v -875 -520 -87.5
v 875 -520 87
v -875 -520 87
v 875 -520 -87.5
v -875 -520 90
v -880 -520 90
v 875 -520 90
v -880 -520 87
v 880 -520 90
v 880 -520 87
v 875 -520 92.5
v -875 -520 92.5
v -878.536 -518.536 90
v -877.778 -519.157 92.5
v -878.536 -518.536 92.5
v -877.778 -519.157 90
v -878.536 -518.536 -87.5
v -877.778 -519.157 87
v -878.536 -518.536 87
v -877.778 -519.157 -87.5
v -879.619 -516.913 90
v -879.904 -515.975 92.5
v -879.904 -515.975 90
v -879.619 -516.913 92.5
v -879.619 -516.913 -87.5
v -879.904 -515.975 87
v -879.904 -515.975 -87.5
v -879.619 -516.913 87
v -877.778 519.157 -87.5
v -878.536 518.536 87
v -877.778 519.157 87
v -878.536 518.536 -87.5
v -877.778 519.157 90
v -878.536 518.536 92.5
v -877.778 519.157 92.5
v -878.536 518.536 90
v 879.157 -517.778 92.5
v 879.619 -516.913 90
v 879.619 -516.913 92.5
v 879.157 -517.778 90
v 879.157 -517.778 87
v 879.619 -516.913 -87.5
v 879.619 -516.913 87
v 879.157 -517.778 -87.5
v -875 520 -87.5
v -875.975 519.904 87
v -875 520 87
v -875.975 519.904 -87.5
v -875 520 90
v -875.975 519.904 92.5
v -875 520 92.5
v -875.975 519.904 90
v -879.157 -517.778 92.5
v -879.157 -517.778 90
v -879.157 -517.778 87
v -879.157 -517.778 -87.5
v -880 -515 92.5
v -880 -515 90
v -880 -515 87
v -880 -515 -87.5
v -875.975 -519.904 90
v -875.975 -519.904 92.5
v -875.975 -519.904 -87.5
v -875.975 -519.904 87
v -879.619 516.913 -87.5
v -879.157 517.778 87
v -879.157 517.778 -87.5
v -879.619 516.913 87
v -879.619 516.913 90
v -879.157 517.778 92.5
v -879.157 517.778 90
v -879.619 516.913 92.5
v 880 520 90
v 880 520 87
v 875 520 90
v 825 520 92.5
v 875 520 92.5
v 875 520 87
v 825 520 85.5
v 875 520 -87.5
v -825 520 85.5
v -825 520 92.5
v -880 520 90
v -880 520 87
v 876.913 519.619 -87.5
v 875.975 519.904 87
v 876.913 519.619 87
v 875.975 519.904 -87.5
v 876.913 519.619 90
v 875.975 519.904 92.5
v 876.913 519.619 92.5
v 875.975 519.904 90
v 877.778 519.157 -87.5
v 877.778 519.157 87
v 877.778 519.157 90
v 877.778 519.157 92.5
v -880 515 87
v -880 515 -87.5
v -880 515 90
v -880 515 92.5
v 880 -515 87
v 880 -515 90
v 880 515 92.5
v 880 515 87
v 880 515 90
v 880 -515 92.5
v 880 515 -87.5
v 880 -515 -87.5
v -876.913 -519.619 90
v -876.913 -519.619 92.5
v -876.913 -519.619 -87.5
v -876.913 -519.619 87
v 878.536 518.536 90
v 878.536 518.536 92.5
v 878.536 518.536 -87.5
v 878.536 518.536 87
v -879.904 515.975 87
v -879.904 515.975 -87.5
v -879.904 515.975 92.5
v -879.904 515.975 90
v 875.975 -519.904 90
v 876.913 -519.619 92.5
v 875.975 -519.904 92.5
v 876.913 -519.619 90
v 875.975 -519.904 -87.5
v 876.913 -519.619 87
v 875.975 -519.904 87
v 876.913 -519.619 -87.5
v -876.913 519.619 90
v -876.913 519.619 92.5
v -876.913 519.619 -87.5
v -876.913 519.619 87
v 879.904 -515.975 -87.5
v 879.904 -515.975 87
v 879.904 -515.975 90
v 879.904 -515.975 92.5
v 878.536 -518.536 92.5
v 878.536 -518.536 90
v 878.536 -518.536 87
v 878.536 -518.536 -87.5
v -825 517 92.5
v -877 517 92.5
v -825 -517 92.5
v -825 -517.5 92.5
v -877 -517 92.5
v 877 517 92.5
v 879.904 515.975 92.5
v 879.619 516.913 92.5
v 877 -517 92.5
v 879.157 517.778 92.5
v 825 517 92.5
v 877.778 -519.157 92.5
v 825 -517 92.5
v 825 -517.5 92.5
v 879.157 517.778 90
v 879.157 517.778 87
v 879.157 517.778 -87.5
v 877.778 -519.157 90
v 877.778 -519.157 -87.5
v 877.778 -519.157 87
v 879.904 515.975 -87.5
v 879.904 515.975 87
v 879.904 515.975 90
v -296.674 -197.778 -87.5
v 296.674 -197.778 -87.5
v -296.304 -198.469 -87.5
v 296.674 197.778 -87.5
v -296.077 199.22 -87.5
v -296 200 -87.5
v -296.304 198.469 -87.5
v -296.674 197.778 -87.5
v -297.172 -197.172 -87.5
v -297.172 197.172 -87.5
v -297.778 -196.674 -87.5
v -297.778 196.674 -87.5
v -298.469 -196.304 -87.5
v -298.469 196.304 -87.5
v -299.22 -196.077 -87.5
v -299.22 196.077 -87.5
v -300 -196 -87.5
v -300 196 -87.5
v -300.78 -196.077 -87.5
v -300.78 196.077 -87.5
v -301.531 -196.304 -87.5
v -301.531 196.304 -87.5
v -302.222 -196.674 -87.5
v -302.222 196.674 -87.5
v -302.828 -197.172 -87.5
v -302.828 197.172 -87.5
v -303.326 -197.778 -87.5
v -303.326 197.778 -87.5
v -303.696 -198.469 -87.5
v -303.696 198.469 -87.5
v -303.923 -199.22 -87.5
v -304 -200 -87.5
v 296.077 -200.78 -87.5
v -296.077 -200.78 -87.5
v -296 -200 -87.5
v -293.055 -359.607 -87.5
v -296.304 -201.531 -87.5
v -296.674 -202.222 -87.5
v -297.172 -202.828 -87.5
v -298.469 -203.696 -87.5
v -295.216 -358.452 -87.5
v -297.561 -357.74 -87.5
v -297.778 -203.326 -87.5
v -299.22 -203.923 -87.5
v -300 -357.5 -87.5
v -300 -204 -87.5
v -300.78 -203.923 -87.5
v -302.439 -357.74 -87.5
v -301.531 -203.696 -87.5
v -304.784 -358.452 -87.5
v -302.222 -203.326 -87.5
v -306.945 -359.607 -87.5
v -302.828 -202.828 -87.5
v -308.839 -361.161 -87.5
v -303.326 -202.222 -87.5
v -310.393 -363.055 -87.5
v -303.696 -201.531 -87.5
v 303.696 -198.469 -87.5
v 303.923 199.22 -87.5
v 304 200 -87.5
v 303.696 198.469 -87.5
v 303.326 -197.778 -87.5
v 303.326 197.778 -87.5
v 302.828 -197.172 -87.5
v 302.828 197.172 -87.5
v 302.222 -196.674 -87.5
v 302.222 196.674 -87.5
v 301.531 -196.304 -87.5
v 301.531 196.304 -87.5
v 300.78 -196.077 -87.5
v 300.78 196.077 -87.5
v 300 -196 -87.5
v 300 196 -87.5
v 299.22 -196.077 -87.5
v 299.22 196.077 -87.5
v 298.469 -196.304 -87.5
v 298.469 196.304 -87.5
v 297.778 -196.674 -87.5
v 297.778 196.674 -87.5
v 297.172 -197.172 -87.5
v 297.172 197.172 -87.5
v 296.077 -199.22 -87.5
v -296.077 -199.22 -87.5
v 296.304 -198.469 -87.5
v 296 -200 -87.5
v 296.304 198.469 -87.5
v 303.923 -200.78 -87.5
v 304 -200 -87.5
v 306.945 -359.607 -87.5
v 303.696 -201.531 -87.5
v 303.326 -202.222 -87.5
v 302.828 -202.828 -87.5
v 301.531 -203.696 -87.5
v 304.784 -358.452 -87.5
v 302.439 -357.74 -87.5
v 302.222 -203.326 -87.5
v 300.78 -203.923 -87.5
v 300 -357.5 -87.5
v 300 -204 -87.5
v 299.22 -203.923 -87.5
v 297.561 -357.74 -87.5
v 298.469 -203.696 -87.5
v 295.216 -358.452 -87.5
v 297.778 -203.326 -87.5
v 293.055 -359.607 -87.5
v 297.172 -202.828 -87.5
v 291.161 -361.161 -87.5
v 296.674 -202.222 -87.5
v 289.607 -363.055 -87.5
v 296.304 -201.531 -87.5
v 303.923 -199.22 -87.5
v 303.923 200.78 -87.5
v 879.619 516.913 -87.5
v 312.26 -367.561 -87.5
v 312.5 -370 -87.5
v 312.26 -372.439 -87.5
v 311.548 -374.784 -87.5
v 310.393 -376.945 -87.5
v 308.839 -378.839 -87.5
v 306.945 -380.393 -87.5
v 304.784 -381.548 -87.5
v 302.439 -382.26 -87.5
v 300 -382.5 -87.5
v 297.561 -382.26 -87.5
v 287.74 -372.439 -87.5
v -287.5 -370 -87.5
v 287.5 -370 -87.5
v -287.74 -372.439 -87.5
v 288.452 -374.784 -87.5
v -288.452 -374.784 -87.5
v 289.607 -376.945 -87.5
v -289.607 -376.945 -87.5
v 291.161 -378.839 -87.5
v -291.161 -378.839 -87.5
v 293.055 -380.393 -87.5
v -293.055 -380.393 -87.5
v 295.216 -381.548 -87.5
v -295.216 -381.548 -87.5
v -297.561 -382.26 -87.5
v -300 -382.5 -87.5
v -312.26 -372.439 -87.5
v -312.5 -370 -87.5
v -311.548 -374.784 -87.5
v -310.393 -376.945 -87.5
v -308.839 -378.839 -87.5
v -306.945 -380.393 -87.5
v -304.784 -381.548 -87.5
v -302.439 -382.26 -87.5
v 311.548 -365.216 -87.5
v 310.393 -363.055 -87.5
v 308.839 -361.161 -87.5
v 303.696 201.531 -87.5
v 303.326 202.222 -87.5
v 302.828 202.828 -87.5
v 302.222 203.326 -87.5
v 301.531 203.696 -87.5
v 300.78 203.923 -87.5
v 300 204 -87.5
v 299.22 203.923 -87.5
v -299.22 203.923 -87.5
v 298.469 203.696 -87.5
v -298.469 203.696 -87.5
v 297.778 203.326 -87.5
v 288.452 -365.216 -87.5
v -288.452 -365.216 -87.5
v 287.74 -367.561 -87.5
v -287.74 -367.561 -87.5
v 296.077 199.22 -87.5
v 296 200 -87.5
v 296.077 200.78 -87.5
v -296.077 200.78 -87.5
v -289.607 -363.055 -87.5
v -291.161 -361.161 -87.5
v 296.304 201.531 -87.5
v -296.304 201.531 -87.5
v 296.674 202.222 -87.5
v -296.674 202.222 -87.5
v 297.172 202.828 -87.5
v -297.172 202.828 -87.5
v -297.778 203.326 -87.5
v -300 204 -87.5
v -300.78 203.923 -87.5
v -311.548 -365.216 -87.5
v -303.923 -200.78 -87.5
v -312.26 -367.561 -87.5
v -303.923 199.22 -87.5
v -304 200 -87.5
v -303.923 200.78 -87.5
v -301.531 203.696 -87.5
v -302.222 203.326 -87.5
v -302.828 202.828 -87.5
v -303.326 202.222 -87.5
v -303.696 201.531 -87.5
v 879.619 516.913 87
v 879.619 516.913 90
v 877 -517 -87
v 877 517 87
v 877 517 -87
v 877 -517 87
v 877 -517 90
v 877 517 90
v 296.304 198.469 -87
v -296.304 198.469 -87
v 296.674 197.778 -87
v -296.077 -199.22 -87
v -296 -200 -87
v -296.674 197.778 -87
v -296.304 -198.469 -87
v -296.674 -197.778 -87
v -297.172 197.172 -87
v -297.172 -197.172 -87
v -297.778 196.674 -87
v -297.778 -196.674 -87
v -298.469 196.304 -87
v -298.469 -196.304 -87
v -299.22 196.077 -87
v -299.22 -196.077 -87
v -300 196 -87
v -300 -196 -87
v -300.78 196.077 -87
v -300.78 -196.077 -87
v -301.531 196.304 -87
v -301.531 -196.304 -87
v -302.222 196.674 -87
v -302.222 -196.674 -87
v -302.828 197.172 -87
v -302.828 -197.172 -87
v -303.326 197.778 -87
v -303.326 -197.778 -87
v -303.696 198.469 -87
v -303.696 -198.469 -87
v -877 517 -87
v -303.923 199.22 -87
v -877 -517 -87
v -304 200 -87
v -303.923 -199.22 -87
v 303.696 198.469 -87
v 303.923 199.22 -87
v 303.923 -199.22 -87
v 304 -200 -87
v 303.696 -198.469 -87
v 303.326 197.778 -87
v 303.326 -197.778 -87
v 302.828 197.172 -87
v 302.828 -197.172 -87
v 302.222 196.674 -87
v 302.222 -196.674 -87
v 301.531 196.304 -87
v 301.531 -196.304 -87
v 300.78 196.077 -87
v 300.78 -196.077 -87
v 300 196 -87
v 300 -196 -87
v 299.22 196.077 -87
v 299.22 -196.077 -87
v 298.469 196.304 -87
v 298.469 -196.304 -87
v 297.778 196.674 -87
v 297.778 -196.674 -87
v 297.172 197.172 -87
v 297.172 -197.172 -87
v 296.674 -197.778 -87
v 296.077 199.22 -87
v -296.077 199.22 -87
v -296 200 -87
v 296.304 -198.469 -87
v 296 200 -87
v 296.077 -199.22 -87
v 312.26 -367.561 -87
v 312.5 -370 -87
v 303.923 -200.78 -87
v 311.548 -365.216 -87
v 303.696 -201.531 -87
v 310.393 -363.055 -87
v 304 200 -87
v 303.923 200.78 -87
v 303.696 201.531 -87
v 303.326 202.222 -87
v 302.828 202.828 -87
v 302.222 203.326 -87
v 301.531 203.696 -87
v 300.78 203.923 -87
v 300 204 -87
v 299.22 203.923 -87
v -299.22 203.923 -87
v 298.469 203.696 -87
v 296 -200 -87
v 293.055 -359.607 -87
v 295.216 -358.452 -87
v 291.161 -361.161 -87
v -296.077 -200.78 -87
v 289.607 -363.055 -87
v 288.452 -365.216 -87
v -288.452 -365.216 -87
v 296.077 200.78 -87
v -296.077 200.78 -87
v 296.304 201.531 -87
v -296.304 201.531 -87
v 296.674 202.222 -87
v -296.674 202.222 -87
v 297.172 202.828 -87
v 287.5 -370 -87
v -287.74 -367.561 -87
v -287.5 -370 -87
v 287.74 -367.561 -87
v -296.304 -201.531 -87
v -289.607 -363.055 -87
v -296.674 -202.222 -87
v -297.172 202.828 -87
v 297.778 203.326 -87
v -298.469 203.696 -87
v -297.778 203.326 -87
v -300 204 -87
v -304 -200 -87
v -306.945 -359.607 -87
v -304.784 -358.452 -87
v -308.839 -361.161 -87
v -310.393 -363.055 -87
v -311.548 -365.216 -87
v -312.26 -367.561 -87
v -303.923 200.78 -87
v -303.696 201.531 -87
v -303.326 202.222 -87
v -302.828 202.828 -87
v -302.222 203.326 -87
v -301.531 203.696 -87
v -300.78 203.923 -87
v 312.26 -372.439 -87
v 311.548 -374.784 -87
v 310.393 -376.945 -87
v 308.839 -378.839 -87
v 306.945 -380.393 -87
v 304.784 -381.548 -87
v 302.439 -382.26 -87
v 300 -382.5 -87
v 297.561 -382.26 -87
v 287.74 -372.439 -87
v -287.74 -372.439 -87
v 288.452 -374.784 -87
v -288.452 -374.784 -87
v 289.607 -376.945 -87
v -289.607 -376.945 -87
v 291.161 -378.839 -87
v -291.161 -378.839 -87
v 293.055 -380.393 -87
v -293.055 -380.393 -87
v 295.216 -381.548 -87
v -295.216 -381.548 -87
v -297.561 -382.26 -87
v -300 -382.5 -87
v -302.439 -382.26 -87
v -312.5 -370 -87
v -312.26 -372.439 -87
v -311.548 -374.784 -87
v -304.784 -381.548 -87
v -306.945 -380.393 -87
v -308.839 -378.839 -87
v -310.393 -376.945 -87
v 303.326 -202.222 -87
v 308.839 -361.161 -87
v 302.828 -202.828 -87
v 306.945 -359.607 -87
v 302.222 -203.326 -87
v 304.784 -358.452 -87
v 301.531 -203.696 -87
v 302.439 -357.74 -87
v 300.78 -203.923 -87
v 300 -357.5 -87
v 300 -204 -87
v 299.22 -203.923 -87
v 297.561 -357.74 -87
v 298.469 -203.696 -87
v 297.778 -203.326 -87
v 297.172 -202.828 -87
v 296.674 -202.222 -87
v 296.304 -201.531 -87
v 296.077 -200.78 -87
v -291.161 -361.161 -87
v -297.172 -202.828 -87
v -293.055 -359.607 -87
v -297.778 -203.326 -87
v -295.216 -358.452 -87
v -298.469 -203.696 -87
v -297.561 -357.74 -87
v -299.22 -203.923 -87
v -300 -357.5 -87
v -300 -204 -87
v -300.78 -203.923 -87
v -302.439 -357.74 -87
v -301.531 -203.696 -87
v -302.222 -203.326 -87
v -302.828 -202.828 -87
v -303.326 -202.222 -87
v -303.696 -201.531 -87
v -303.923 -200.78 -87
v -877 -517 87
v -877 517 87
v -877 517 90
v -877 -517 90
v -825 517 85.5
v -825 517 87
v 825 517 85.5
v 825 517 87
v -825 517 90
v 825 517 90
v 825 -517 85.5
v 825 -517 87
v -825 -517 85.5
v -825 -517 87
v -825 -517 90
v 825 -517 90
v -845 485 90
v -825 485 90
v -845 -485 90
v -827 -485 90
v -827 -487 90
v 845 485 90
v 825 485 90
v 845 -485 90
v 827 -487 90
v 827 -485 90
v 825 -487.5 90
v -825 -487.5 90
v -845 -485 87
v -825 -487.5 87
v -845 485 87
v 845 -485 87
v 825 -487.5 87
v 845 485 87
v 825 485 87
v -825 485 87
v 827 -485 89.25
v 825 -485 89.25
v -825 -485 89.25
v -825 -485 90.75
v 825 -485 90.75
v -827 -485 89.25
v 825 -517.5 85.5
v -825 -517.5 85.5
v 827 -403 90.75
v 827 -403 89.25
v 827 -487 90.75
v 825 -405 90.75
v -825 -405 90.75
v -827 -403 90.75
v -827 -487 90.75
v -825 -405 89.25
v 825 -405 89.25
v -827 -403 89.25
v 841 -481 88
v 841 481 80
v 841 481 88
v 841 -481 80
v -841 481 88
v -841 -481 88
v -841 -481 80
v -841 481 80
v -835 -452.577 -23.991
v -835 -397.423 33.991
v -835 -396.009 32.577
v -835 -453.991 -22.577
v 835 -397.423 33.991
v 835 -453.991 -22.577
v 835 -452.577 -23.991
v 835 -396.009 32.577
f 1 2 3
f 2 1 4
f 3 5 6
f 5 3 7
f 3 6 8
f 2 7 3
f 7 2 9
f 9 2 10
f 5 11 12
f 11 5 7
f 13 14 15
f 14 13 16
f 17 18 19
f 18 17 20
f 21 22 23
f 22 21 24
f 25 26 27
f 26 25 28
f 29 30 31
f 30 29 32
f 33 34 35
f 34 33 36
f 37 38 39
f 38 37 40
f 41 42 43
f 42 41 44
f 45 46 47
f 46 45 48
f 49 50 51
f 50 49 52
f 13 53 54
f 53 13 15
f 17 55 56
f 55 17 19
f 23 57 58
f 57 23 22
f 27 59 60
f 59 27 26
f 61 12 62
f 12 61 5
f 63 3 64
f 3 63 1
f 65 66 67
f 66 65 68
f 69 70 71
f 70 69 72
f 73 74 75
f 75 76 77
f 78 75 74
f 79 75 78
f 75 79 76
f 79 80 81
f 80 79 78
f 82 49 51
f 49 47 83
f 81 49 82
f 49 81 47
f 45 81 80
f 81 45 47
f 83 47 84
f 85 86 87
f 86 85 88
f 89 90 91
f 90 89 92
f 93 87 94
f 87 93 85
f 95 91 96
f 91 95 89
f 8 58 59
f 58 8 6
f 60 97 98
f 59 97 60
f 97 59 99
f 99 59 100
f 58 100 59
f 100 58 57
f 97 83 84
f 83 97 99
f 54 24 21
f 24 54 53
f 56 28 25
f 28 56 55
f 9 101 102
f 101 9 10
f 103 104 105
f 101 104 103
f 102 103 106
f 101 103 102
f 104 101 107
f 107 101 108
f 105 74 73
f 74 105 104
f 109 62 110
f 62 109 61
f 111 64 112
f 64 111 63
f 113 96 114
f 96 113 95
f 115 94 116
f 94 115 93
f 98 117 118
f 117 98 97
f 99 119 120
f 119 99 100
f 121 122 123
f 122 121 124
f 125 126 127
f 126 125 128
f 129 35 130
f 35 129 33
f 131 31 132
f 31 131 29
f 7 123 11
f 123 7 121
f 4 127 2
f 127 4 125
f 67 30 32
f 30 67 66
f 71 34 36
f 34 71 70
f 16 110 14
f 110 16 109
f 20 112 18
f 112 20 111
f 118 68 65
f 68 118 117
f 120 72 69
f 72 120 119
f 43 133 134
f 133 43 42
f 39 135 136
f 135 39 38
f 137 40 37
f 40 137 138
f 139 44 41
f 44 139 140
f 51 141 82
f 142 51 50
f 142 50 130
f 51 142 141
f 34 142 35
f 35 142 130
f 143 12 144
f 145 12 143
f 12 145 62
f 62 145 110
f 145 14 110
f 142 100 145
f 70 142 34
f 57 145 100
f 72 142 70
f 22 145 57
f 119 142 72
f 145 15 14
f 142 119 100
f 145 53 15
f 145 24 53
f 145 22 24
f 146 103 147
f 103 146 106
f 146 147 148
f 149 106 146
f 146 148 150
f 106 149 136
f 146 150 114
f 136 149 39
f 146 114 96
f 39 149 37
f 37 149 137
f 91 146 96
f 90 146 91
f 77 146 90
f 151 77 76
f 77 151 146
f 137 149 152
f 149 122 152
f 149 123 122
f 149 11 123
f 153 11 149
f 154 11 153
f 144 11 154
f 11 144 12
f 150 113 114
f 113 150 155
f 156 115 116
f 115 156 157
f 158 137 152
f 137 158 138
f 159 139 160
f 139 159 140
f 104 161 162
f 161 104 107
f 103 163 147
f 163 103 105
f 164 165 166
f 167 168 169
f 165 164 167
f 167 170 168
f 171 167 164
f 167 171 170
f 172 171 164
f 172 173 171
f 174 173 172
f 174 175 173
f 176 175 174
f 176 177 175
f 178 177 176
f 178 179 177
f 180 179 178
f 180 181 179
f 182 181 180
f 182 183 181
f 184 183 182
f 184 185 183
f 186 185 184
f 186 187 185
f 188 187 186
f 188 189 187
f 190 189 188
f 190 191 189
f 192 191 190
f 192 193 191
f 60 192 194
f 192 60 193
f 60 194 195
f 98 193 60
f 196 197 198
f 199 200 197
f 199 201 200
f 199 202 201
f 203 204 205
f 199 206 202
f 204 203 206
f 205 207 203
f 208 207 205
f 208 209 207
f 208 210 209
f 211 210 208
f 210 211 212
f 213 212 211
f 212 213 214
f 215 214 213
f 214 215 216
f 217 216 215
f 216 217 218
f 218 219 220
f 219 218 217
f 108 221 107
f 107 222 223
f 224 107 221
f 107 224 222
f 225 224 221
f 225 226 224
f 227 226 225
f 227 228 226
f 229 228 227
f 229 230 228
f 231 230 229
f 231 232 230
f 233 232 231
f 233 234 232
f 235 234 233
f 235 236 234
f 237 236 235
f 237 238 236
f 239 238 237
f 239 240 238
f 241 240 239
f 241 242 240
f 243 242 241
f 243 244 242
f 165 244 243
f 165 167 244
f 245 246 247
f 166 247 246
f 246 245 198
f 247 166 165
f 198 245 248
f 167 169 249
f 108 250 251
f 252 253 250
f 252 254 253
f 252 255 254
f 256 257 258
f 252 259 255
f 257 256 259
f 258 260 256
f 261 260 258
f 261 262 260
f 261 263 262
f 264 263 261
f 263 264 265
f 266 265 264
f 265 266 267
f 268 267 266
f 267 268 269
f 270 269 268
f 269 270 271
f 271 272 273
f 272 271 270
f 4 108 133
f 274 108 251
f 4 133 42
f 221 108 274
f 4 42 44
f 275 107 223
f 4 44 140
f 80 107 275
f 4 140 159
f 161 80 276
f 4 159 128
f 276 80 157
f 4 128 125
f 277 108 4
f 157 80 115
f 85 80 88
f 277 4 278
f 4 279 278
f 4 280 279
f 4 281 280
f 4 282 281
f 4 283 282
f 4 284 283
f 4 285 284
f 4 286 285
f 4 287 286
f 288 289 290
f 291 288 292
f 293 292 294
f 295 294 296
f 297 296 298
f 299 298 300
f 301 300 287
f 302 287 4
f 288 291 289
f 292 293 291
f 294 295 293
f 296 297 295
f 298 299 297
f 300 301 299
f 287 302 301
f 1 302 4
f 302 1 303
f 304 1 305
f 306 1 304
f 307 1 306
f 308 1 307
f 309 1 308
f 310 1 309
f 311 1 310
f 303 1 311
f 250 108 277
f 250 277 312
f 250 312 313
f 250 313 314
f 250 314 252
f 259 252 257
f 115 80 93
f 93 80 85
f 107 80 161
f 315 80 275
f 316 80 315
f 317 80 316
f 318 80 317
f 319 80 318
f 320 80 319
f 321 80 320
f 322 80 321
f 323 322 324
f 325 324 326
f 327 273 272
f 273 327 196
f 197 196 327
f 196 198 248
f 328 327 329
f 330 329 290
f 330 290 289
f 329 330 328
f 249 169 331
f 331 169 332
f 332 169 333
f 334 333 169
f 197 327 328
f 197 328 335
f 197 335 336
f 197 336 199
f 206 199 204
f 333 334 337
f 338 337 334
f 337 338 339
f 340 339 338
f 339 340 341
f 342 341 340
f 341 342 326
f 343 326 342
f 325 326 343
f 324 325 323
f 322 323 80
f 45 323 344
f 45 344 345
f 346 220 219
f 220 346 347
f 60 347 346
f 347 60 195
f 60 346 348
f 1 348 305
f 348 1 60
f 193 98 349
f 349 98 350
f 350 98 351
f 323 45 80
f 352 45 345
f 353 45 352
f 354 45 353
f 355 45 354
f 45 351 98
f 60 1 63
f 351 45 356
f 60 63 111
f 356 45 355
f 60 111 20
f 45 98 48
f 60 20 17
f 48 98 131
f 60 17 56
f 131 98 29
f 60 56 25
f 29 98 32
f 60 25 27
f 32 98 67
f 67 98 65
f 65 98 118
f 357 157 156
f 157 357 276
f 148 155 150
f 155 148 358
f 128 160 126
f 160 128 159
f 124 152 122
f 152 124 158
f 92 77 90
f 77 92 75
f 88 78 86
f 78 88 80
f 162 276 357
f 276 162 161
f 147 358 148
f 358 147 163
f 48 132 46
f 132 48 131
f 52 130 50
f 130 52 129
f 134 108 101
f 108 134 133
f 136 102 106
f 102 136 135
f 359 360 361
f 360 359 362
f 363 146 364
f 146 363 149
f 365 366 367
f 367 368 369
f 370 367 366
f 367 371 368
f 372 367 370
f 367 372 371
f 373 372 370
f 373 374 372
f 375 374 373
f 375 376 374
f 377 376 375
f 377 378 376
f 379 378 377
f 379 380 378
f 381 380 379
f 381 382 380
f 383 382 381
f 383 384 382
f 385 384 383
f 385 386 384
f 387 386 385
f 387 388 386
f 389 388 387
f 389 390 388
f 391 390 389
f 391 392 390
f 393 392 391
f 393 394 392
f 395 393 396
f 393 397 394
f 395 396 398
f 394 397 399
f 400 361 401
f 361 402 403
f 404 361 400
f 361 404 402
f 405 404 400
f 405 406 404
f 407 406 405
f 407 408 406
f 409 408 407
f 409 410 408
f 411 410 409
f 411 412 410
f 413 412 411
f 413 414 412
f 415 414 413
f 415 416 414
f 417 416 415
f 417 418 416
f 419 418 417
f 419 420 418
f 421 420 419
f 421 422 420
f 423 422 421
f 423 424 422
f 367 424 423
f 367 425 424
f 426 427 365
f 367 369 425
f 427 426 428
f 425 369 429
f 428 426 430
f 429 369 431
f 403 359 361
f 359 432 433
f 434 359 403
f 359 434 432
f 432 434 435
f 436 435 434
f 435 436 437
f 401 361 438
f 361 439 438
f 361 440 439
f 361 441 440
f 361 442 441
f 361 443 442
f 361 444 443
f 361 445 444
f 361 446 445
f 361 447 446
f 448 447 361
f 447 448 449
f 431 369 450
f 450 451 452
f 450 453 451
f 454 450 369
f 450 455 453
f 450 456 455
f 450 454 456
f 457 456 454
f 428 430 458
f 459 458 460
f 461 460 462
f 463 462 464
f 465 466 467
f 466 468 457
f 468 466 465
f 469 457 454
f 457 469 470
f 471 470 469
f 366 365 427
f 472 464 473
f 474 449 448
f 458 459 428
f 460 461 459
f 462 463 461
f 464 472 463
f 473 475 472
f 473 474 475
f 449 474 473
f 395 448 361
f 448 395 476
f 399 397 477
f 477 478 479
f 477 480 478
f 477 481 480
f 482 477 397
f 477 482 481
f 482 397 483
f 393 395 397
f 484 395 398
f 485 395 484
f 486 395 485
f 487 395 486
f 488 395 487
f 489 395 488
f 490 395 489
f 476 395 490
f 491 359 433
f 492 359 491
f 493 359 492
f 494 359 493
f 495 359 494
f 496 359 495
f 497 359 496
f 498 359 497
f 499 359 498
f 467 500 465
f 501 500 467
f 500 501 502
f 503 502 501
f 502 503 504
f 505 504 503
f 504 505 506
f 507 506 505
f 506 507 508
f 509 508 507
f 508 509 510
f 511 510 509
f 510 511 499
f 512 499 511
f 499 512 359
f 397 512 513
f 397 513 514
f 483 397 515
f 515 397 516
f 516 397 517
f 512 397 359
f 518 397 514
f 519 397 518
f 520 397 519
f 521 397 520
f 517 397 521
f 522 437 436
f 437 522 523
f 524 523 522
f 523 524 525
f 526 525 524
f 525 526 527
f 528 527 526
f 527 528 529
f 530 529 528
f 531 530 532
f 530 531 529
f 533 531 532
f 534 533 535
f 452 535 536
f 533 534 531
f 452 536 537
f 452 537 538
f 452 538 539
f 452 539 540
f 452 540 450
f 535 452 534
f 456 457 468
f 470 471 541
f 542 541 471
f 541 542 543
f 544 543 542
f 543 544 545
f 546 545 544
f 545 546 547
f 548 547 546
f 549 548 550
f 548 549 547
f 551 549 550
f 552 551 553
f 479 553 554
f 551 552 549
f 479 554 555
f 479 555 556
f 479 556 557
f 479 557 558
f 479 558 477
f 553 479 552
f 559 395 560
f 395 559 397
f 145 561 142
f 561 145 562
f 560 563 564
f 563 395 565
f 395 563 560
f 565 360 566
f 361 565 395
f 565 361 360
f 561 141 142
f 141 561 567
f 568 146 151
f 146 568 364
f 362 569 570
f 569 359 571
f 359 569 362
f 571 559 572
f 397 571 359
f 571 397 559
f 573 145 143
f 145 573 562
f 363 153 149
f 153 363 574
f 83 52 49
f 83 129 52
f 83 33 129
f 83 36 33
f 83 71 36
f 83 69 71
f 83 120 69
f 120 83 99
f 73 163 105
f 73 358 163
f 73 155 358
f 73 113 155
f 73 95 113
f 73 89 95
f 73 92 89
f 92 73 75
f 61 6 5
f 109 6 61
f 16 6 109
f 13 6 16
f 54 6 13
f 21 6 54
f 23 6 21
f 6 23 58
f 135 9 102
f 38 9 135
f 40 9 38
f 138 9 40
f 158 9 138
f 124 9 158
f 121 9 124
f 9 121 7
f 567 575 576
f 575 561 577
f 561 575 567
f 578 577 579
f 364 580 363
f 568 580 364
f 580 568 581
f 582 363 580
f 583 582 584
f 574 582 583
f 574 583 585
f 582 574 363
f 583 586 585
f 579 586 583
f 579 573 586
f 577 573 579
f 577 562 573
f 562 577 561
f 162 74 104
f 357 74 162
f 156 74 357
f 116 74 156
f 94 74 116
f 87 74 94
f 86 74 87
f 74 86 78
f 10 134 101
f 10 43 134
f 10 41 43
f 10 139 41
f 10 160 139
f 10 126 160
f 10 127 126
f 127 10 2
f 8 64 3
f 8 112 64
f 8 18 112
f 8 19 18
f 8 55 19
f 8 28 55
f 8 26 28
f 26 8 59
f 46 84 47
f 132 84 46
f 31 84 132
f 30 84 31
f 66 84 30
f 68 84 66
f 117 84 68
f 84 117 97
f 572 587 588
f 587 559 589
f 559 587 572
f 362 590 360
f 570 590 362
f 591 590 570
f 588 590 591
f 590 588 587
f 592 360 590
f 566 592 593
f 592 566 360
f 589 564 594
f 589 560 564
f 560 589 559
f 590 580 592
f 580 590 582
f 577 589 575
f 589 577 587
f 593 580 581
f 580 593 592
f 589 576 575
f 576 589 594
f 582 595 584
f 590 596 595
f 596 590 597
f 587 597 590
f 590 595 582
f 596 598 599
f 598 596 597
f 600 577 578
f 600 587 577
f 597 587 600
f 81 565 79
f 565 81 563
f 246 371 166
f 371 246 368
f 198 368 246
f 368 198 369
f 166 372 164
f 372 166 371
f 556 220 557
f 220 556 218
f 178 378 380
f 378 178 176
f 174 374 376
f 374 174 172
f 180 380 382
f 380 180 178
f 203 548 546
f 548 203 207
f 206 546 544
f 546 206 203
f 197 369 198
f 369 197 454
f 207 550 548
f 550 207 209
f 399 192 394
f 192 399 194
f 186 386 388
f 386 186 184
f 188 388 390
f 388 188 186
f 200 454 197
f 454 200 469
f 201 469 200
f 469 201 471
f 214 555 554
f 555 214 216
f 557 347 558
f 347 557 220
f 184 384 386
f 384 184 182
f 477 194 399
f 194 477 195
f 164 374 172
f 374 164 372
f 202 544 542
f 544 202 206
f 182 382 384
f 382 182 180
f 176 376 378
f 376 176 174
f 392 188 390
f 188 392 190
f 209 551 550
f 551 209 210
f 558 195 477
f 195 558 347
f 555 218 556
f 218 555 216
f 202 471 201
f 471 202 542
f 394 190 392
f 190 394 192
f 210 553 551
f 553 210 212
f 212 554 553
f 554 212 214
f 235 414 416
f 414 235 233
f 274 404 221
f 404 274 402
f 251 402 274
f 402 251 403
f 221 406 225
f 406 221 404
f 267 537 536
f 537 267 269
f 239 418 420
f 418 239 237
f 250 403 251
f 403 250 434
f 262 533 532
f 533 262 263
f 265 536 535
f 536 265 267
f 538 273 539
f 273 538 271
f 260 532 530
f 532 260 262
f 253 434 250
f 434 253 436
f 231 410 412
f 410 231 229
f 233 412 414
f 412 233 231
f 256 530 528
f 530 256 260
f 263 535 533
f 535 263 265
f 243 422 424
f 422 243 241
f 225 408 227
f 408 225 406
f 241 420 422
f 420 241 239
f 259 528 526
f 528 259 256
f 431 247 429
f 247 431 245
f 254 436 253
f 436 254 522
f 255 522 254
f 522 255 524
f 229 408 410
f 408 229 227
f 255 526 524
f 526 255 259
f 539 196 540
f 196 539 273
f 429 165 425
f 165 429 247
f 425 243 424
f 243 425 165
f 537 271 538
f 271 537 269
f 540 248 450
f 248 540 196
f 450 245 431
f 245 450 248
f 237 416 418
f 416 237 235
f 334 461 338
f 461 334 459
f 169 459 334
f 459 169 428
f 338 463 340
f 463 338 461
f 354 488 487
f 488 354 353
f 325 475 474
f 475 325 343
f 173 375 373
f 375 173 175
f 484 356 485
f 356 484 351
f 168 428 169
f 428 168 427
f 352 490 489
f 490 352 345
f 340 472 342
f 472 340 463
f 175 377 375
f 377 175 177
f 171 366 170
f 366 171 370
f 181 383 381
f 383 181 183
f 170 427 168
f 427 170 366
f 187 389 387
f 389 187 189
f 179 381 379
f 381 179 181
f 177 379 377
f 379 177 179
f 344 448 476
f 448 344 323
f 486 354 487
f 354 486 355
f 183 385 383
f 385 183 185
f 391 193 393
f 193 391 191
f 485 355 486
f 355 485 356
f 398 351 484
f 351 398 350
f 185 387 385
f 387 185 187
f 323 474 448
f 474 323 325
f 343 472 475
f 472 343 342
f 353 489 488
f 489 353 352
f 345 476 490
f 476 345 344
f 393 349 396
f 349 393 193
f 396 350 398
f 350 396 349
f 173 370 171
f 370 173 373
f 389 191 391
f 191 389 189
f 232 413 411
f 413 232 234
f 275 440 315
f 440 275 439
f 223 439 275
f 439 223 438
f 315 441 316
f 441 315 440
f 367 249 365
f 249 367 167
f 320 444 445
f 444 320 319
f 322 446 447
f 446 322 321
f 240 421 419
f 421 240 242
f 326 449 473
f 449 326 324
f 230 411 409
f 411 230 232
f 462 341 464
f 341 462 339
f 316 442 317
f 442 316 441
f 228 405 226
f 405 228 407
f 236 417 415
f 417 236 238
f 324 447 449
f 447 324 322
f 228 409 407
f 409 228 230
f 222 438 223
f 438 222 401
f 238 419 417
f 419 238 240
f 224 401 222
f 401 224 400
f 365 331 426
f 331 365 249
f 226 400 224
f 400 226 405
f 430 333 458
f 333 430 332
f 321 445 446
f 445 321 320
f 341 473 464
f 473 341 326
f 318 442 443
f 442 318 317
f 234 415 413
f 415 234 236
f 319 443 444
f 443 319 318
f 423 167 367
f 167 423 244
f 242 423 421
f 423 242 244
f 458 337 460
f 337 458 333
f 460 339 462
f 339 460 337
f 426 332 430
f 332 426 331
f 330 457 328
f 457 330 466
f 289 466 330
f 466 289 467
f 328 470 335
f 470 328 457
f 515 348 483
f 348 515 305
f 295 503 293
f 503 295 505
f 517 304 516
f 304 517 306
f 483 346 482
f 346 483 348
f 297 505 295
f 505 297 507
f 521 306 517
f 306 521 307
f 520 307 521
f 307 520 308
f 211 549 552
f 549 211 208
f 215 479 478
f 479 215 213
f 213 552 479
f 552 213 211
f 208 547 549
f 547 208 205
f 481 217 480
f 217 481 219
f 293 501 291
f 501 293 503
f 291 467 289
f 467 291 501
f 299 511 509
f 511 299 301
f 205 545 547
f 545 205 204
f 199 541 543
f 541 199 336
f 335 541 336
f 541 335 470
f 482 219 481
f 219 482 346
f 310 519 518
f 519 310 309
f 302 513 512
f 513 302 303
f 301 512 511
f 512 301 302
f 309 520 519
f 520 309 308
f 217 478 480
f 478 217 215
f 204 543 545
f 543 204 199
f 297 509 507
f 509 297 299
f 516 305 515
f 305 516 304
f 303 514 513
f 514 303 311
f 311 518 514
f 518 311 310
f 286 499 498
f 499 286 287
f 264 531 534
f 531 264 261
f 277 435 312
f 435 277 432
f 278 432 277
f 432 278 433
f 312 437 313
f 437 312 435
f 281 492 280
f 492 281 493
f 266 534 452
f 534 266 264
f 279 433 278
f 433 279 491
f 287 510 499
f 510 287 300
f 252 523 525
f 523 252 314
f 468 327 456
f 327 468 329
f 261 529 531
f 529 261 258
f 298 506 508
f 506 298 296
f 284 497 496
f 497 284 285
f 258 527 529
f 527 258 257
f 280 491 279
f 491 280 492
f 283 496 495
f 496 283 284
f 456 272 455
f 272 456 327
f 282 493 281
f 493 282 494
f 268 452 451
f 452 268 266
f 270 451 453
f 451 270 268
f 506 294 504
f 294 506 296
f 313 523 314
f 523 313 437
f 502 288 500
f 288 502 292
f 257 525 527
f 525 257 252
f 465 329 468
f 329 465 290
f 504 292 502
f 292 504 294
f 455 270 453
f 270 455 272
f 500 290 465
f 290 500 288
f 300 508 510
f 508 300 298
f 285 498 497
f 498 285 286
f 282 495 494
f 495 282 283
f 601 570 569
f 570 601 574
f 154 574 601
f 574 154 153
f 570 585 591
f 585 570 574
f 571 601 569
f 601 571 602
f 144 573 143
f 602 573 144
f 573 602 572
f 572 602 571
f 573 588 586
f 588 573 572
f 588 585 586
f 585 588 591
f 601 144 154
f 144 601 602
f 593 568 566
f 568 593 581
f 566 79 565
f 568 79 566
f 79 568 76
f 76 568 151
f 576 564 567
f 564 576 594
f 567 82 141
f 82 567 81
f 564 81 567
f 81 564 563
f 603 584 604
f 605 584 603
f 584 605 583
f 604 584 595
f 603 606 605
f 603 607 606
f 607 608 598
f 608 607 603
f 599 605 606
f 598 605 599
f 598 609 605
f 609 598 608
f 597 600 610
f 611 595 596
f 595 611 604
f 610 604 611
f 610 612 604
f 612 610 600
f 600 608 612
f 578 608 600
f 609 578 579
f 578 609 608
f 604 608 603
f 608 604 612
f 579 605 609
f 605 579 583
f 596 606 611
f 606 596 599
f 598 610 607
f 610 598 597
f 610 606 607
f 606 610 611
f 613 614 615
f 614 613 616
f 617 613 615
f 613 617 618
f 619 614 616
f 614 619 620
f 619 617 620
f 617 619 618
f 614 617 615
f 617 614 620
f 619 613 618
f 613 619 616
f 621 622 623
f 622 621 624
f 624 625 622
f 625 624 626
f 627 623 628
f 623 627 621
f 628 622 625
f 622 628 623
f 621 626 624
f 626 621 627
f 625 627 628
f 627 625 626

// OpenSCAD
// ATE-75 Outdoor TV Enclosure - OpenSCAD Model v5.1
// Apex Enclosures - Ducted Rear Plenum Design
// All dimensions in mm

// ============================================
// PARAMETERS (v5.1)
// ============================================

// Overall dimensions
WIDTH = 1760;       // External width
HEIGHT = 1040;      // External height
DEPTH = 180;        // External depth (was 120mm in v3)

// Frame construction
BEZEL_WIDTH = 35;   // Bezel width
WALL_THICK = 3;     // Aluminum wall thickness

// Internal layout
GLASS_THICK = 8;        // 4+4 laminated glass
FRONT_GAP = 27;         // Gap between glass and TV
TV_ZONE = 90;           // TV mounting depth
REAR_PLENUM = 50;       // Air channel behind TV

// Airflow slots
INTAKE_SLOT_WIDTH = 1650;
INTAKE_SLOT_HEIGHT = 30;
EXHAUST_SLOT_WIDTH = 1650;
EXHAUST_SLOT_HEIGHT = 35;

// Fan specifications (3 positions, 2 active + 1 blank)
FAN_POSITIONS = 3;
FAN_DIAMETER = 140;
FAN_SPACING = 400;

// Service door
SERVICE_DOOR_WIDTH = 1650;
SERVICE_DOOR_HEIGHT = 80;

// VESA mount (600x400 for 75" TV)
VESA_H = 600;
VESA_V = 400;
VESA_HOLE = 8;      // M8 holes

// Corner radius for aesthetics
CORNER_R = 5;

// ============================================
// MAIN ENCLOSURE
// ============================================

module outer_shell() {
    difference() {
        // Outer body with rounded corners
        minkowski() {
            cube([WIDTH - CORNER_R*2, HEIGHT - CORNER_R*2, DEPTH - CORNER_R], center=true);
            cylinder(r=CORNER_R, h=CORNER_R, $fn=32);
        }

        // Inner cavity (hollow out, leaving walls)
        translate([0, 0, WALL_THICK])
        cube([WIDTH - WALL_THICK*2, HEIGHT - WALL_THICK*2, DEPTH], center=true);
    }
}

// ============================================
// FRONT BEZEL FRAME
// ============================================

module bezel_frame() {
    difference() {
        // Full front face
        translate([0, 0, DEPTH/2 - WALL_THICK/2])
        cube([WIDTH, HEIGHT, WALL_THICK], center=true);

        // Glass opening (cut out center)
        translate([0, 0, DEPTH/2])
        cube([WIDTH - BEZEL_WIDTH*2, HEIGHT - BEZEL_WIDTH*2, WALL_THICK*2], center=true);
    }
}

// ============================================
// BOTTOM INTAKE SLOT
// ============================================

module intake_slot() {
    translate([0, -HEIGHT/2 + BEZEL_WIDTH/2, DEPTH/2])
    cube([INTAKE_SLOT_WIDTH, INTAKE_SLOT_HEIGHT, WALL_THICK*3], center=true);
}

// ============================================
// TOP EXHAUST SLOT
// ============================================

module exhaust_slot() {
    translate([0, HEIGHT/2 - BEZEL_WIDTH/2, DEPTH/2])
    cube([EXHAUST_SLOT_WIDTH, EXHAUST_SLOT_HEIGHT, WALL_THICK*3], center=true);
}

// ============================================
// FAN HOLES (3 positions in top bezel)
// ============================================

module fan_holes() {
    for (i = [-1, 0, 1]) {
        translate([i * FAN_SPACING, HEIGHT/2 - BEZEL_WIDTH/2, DEPTH/2])
        cylinder(d=FAN_DIAMETER, h=WALL_THICK*3, center=true, $fn=64);
    }
}

// ============================================
// SERVICE DOOR OUTLINE
// ============================================

module service_door() {
    // Visual outline of service door in bottom bezel
    translate([0, -HEIGHT/2 + BEZEL_WIDTH + SERVICE_DOOR_HEIGHT/2, DEPTH/2])
    difference() {
        cube([SERVICE_DOOR_WIDTH + 4, SERVICE_DOOR_HEIGHT + 4, WALL_THICK*0.5], center=true);
        cube([SERVICE_DOOR_WIDTH, SERVICE_DOOR_HEIGHT, WALL_THICK], center=true);
    }
}

// ============================================
// VESA MOUNT PATTERN (on rear panel)
// ============================================

module vesa_holes() {
    positions = [
        [-VESA_H/2, -VESA_V/2],
        [VESA_H/2, -VESA_V/2],
        [-VESA_H/2, VESA_V/2],
        [VESA_H/2, VESA_V/2]
    ];

    for (pos = positions) {
        translate([pos[0], pos[1], -DEPTH/2])
        cylinder(d=VESA_HOLE, h=WALL_THICK*3, $fn=32);
    }
}

// ============================================
// CABLE ENTRY HOLES
// ============================================

module cable_holes() {
    for (x = [-300, 300]) {
        translate([x, -HEIGHT/2 + 150, -DEPTH/2])
        cylinder(d=25, h=WALL_THICK*3, $fn=32);
    }
}

// ============================================
// GLASS PANEL
// ============================================

module glass_panel() {
    color("LightBlue", 0.3)
    translate([0, 0, DEPTH/2 - GLASS_THICK/2 - 2])
    cube([WIDTH - BEZEL_WIDTH*2 - 8, HEIGHT - BEZEL_WIDTH*2 - 8, GLASS_THICK], center=true);
}

// ============================================
// INTERNAL BAFFLE (visualization)
// ============================================

module internal_baffle() {
    color("DarkGray", 0.5)
    translate([0, -HEIGHT/2 + BEZEL_WIDTH + 60, DEPTH/2 - FRONT_GAP - GLASS_THICK - 50])
    rotate([45, 0, 0])
    cube([WIDTH - BEZEL_WIDTH*2 - 20, 80, 2], center=true);
}

// ============================================
// ASSEMBLE COMPLETE ENCLOSURE
// ============================================

module enclosure() {
    difference() {
        union() {
            outer_shell();
            bezel_frame();
        }
        intake_slot();
        exhaust_slot();
        fan_holes();
        vesa_holes();
        cable_holes();
    }
}

// ============================================
// RENDER
// ============================================

// Main enclosure body (aluminum)
color("DimGray")
enclosure();

// Service door outline
color("Gray")
service_door();

// Glass panel (transparent blue)
glass_panel();

// Internal baffle (for visualization)
internal_baffle();

// Info text
echo("ATE-75 Enclosure v5.1");
echo(str("Dimensions: ", WIDTH, " x ", HEIGHT, " x ", DEPTH, "mm"));
echo("Ducted Rear Plenum Design - PASS FOR PROTOTYPE VALIDATION");
